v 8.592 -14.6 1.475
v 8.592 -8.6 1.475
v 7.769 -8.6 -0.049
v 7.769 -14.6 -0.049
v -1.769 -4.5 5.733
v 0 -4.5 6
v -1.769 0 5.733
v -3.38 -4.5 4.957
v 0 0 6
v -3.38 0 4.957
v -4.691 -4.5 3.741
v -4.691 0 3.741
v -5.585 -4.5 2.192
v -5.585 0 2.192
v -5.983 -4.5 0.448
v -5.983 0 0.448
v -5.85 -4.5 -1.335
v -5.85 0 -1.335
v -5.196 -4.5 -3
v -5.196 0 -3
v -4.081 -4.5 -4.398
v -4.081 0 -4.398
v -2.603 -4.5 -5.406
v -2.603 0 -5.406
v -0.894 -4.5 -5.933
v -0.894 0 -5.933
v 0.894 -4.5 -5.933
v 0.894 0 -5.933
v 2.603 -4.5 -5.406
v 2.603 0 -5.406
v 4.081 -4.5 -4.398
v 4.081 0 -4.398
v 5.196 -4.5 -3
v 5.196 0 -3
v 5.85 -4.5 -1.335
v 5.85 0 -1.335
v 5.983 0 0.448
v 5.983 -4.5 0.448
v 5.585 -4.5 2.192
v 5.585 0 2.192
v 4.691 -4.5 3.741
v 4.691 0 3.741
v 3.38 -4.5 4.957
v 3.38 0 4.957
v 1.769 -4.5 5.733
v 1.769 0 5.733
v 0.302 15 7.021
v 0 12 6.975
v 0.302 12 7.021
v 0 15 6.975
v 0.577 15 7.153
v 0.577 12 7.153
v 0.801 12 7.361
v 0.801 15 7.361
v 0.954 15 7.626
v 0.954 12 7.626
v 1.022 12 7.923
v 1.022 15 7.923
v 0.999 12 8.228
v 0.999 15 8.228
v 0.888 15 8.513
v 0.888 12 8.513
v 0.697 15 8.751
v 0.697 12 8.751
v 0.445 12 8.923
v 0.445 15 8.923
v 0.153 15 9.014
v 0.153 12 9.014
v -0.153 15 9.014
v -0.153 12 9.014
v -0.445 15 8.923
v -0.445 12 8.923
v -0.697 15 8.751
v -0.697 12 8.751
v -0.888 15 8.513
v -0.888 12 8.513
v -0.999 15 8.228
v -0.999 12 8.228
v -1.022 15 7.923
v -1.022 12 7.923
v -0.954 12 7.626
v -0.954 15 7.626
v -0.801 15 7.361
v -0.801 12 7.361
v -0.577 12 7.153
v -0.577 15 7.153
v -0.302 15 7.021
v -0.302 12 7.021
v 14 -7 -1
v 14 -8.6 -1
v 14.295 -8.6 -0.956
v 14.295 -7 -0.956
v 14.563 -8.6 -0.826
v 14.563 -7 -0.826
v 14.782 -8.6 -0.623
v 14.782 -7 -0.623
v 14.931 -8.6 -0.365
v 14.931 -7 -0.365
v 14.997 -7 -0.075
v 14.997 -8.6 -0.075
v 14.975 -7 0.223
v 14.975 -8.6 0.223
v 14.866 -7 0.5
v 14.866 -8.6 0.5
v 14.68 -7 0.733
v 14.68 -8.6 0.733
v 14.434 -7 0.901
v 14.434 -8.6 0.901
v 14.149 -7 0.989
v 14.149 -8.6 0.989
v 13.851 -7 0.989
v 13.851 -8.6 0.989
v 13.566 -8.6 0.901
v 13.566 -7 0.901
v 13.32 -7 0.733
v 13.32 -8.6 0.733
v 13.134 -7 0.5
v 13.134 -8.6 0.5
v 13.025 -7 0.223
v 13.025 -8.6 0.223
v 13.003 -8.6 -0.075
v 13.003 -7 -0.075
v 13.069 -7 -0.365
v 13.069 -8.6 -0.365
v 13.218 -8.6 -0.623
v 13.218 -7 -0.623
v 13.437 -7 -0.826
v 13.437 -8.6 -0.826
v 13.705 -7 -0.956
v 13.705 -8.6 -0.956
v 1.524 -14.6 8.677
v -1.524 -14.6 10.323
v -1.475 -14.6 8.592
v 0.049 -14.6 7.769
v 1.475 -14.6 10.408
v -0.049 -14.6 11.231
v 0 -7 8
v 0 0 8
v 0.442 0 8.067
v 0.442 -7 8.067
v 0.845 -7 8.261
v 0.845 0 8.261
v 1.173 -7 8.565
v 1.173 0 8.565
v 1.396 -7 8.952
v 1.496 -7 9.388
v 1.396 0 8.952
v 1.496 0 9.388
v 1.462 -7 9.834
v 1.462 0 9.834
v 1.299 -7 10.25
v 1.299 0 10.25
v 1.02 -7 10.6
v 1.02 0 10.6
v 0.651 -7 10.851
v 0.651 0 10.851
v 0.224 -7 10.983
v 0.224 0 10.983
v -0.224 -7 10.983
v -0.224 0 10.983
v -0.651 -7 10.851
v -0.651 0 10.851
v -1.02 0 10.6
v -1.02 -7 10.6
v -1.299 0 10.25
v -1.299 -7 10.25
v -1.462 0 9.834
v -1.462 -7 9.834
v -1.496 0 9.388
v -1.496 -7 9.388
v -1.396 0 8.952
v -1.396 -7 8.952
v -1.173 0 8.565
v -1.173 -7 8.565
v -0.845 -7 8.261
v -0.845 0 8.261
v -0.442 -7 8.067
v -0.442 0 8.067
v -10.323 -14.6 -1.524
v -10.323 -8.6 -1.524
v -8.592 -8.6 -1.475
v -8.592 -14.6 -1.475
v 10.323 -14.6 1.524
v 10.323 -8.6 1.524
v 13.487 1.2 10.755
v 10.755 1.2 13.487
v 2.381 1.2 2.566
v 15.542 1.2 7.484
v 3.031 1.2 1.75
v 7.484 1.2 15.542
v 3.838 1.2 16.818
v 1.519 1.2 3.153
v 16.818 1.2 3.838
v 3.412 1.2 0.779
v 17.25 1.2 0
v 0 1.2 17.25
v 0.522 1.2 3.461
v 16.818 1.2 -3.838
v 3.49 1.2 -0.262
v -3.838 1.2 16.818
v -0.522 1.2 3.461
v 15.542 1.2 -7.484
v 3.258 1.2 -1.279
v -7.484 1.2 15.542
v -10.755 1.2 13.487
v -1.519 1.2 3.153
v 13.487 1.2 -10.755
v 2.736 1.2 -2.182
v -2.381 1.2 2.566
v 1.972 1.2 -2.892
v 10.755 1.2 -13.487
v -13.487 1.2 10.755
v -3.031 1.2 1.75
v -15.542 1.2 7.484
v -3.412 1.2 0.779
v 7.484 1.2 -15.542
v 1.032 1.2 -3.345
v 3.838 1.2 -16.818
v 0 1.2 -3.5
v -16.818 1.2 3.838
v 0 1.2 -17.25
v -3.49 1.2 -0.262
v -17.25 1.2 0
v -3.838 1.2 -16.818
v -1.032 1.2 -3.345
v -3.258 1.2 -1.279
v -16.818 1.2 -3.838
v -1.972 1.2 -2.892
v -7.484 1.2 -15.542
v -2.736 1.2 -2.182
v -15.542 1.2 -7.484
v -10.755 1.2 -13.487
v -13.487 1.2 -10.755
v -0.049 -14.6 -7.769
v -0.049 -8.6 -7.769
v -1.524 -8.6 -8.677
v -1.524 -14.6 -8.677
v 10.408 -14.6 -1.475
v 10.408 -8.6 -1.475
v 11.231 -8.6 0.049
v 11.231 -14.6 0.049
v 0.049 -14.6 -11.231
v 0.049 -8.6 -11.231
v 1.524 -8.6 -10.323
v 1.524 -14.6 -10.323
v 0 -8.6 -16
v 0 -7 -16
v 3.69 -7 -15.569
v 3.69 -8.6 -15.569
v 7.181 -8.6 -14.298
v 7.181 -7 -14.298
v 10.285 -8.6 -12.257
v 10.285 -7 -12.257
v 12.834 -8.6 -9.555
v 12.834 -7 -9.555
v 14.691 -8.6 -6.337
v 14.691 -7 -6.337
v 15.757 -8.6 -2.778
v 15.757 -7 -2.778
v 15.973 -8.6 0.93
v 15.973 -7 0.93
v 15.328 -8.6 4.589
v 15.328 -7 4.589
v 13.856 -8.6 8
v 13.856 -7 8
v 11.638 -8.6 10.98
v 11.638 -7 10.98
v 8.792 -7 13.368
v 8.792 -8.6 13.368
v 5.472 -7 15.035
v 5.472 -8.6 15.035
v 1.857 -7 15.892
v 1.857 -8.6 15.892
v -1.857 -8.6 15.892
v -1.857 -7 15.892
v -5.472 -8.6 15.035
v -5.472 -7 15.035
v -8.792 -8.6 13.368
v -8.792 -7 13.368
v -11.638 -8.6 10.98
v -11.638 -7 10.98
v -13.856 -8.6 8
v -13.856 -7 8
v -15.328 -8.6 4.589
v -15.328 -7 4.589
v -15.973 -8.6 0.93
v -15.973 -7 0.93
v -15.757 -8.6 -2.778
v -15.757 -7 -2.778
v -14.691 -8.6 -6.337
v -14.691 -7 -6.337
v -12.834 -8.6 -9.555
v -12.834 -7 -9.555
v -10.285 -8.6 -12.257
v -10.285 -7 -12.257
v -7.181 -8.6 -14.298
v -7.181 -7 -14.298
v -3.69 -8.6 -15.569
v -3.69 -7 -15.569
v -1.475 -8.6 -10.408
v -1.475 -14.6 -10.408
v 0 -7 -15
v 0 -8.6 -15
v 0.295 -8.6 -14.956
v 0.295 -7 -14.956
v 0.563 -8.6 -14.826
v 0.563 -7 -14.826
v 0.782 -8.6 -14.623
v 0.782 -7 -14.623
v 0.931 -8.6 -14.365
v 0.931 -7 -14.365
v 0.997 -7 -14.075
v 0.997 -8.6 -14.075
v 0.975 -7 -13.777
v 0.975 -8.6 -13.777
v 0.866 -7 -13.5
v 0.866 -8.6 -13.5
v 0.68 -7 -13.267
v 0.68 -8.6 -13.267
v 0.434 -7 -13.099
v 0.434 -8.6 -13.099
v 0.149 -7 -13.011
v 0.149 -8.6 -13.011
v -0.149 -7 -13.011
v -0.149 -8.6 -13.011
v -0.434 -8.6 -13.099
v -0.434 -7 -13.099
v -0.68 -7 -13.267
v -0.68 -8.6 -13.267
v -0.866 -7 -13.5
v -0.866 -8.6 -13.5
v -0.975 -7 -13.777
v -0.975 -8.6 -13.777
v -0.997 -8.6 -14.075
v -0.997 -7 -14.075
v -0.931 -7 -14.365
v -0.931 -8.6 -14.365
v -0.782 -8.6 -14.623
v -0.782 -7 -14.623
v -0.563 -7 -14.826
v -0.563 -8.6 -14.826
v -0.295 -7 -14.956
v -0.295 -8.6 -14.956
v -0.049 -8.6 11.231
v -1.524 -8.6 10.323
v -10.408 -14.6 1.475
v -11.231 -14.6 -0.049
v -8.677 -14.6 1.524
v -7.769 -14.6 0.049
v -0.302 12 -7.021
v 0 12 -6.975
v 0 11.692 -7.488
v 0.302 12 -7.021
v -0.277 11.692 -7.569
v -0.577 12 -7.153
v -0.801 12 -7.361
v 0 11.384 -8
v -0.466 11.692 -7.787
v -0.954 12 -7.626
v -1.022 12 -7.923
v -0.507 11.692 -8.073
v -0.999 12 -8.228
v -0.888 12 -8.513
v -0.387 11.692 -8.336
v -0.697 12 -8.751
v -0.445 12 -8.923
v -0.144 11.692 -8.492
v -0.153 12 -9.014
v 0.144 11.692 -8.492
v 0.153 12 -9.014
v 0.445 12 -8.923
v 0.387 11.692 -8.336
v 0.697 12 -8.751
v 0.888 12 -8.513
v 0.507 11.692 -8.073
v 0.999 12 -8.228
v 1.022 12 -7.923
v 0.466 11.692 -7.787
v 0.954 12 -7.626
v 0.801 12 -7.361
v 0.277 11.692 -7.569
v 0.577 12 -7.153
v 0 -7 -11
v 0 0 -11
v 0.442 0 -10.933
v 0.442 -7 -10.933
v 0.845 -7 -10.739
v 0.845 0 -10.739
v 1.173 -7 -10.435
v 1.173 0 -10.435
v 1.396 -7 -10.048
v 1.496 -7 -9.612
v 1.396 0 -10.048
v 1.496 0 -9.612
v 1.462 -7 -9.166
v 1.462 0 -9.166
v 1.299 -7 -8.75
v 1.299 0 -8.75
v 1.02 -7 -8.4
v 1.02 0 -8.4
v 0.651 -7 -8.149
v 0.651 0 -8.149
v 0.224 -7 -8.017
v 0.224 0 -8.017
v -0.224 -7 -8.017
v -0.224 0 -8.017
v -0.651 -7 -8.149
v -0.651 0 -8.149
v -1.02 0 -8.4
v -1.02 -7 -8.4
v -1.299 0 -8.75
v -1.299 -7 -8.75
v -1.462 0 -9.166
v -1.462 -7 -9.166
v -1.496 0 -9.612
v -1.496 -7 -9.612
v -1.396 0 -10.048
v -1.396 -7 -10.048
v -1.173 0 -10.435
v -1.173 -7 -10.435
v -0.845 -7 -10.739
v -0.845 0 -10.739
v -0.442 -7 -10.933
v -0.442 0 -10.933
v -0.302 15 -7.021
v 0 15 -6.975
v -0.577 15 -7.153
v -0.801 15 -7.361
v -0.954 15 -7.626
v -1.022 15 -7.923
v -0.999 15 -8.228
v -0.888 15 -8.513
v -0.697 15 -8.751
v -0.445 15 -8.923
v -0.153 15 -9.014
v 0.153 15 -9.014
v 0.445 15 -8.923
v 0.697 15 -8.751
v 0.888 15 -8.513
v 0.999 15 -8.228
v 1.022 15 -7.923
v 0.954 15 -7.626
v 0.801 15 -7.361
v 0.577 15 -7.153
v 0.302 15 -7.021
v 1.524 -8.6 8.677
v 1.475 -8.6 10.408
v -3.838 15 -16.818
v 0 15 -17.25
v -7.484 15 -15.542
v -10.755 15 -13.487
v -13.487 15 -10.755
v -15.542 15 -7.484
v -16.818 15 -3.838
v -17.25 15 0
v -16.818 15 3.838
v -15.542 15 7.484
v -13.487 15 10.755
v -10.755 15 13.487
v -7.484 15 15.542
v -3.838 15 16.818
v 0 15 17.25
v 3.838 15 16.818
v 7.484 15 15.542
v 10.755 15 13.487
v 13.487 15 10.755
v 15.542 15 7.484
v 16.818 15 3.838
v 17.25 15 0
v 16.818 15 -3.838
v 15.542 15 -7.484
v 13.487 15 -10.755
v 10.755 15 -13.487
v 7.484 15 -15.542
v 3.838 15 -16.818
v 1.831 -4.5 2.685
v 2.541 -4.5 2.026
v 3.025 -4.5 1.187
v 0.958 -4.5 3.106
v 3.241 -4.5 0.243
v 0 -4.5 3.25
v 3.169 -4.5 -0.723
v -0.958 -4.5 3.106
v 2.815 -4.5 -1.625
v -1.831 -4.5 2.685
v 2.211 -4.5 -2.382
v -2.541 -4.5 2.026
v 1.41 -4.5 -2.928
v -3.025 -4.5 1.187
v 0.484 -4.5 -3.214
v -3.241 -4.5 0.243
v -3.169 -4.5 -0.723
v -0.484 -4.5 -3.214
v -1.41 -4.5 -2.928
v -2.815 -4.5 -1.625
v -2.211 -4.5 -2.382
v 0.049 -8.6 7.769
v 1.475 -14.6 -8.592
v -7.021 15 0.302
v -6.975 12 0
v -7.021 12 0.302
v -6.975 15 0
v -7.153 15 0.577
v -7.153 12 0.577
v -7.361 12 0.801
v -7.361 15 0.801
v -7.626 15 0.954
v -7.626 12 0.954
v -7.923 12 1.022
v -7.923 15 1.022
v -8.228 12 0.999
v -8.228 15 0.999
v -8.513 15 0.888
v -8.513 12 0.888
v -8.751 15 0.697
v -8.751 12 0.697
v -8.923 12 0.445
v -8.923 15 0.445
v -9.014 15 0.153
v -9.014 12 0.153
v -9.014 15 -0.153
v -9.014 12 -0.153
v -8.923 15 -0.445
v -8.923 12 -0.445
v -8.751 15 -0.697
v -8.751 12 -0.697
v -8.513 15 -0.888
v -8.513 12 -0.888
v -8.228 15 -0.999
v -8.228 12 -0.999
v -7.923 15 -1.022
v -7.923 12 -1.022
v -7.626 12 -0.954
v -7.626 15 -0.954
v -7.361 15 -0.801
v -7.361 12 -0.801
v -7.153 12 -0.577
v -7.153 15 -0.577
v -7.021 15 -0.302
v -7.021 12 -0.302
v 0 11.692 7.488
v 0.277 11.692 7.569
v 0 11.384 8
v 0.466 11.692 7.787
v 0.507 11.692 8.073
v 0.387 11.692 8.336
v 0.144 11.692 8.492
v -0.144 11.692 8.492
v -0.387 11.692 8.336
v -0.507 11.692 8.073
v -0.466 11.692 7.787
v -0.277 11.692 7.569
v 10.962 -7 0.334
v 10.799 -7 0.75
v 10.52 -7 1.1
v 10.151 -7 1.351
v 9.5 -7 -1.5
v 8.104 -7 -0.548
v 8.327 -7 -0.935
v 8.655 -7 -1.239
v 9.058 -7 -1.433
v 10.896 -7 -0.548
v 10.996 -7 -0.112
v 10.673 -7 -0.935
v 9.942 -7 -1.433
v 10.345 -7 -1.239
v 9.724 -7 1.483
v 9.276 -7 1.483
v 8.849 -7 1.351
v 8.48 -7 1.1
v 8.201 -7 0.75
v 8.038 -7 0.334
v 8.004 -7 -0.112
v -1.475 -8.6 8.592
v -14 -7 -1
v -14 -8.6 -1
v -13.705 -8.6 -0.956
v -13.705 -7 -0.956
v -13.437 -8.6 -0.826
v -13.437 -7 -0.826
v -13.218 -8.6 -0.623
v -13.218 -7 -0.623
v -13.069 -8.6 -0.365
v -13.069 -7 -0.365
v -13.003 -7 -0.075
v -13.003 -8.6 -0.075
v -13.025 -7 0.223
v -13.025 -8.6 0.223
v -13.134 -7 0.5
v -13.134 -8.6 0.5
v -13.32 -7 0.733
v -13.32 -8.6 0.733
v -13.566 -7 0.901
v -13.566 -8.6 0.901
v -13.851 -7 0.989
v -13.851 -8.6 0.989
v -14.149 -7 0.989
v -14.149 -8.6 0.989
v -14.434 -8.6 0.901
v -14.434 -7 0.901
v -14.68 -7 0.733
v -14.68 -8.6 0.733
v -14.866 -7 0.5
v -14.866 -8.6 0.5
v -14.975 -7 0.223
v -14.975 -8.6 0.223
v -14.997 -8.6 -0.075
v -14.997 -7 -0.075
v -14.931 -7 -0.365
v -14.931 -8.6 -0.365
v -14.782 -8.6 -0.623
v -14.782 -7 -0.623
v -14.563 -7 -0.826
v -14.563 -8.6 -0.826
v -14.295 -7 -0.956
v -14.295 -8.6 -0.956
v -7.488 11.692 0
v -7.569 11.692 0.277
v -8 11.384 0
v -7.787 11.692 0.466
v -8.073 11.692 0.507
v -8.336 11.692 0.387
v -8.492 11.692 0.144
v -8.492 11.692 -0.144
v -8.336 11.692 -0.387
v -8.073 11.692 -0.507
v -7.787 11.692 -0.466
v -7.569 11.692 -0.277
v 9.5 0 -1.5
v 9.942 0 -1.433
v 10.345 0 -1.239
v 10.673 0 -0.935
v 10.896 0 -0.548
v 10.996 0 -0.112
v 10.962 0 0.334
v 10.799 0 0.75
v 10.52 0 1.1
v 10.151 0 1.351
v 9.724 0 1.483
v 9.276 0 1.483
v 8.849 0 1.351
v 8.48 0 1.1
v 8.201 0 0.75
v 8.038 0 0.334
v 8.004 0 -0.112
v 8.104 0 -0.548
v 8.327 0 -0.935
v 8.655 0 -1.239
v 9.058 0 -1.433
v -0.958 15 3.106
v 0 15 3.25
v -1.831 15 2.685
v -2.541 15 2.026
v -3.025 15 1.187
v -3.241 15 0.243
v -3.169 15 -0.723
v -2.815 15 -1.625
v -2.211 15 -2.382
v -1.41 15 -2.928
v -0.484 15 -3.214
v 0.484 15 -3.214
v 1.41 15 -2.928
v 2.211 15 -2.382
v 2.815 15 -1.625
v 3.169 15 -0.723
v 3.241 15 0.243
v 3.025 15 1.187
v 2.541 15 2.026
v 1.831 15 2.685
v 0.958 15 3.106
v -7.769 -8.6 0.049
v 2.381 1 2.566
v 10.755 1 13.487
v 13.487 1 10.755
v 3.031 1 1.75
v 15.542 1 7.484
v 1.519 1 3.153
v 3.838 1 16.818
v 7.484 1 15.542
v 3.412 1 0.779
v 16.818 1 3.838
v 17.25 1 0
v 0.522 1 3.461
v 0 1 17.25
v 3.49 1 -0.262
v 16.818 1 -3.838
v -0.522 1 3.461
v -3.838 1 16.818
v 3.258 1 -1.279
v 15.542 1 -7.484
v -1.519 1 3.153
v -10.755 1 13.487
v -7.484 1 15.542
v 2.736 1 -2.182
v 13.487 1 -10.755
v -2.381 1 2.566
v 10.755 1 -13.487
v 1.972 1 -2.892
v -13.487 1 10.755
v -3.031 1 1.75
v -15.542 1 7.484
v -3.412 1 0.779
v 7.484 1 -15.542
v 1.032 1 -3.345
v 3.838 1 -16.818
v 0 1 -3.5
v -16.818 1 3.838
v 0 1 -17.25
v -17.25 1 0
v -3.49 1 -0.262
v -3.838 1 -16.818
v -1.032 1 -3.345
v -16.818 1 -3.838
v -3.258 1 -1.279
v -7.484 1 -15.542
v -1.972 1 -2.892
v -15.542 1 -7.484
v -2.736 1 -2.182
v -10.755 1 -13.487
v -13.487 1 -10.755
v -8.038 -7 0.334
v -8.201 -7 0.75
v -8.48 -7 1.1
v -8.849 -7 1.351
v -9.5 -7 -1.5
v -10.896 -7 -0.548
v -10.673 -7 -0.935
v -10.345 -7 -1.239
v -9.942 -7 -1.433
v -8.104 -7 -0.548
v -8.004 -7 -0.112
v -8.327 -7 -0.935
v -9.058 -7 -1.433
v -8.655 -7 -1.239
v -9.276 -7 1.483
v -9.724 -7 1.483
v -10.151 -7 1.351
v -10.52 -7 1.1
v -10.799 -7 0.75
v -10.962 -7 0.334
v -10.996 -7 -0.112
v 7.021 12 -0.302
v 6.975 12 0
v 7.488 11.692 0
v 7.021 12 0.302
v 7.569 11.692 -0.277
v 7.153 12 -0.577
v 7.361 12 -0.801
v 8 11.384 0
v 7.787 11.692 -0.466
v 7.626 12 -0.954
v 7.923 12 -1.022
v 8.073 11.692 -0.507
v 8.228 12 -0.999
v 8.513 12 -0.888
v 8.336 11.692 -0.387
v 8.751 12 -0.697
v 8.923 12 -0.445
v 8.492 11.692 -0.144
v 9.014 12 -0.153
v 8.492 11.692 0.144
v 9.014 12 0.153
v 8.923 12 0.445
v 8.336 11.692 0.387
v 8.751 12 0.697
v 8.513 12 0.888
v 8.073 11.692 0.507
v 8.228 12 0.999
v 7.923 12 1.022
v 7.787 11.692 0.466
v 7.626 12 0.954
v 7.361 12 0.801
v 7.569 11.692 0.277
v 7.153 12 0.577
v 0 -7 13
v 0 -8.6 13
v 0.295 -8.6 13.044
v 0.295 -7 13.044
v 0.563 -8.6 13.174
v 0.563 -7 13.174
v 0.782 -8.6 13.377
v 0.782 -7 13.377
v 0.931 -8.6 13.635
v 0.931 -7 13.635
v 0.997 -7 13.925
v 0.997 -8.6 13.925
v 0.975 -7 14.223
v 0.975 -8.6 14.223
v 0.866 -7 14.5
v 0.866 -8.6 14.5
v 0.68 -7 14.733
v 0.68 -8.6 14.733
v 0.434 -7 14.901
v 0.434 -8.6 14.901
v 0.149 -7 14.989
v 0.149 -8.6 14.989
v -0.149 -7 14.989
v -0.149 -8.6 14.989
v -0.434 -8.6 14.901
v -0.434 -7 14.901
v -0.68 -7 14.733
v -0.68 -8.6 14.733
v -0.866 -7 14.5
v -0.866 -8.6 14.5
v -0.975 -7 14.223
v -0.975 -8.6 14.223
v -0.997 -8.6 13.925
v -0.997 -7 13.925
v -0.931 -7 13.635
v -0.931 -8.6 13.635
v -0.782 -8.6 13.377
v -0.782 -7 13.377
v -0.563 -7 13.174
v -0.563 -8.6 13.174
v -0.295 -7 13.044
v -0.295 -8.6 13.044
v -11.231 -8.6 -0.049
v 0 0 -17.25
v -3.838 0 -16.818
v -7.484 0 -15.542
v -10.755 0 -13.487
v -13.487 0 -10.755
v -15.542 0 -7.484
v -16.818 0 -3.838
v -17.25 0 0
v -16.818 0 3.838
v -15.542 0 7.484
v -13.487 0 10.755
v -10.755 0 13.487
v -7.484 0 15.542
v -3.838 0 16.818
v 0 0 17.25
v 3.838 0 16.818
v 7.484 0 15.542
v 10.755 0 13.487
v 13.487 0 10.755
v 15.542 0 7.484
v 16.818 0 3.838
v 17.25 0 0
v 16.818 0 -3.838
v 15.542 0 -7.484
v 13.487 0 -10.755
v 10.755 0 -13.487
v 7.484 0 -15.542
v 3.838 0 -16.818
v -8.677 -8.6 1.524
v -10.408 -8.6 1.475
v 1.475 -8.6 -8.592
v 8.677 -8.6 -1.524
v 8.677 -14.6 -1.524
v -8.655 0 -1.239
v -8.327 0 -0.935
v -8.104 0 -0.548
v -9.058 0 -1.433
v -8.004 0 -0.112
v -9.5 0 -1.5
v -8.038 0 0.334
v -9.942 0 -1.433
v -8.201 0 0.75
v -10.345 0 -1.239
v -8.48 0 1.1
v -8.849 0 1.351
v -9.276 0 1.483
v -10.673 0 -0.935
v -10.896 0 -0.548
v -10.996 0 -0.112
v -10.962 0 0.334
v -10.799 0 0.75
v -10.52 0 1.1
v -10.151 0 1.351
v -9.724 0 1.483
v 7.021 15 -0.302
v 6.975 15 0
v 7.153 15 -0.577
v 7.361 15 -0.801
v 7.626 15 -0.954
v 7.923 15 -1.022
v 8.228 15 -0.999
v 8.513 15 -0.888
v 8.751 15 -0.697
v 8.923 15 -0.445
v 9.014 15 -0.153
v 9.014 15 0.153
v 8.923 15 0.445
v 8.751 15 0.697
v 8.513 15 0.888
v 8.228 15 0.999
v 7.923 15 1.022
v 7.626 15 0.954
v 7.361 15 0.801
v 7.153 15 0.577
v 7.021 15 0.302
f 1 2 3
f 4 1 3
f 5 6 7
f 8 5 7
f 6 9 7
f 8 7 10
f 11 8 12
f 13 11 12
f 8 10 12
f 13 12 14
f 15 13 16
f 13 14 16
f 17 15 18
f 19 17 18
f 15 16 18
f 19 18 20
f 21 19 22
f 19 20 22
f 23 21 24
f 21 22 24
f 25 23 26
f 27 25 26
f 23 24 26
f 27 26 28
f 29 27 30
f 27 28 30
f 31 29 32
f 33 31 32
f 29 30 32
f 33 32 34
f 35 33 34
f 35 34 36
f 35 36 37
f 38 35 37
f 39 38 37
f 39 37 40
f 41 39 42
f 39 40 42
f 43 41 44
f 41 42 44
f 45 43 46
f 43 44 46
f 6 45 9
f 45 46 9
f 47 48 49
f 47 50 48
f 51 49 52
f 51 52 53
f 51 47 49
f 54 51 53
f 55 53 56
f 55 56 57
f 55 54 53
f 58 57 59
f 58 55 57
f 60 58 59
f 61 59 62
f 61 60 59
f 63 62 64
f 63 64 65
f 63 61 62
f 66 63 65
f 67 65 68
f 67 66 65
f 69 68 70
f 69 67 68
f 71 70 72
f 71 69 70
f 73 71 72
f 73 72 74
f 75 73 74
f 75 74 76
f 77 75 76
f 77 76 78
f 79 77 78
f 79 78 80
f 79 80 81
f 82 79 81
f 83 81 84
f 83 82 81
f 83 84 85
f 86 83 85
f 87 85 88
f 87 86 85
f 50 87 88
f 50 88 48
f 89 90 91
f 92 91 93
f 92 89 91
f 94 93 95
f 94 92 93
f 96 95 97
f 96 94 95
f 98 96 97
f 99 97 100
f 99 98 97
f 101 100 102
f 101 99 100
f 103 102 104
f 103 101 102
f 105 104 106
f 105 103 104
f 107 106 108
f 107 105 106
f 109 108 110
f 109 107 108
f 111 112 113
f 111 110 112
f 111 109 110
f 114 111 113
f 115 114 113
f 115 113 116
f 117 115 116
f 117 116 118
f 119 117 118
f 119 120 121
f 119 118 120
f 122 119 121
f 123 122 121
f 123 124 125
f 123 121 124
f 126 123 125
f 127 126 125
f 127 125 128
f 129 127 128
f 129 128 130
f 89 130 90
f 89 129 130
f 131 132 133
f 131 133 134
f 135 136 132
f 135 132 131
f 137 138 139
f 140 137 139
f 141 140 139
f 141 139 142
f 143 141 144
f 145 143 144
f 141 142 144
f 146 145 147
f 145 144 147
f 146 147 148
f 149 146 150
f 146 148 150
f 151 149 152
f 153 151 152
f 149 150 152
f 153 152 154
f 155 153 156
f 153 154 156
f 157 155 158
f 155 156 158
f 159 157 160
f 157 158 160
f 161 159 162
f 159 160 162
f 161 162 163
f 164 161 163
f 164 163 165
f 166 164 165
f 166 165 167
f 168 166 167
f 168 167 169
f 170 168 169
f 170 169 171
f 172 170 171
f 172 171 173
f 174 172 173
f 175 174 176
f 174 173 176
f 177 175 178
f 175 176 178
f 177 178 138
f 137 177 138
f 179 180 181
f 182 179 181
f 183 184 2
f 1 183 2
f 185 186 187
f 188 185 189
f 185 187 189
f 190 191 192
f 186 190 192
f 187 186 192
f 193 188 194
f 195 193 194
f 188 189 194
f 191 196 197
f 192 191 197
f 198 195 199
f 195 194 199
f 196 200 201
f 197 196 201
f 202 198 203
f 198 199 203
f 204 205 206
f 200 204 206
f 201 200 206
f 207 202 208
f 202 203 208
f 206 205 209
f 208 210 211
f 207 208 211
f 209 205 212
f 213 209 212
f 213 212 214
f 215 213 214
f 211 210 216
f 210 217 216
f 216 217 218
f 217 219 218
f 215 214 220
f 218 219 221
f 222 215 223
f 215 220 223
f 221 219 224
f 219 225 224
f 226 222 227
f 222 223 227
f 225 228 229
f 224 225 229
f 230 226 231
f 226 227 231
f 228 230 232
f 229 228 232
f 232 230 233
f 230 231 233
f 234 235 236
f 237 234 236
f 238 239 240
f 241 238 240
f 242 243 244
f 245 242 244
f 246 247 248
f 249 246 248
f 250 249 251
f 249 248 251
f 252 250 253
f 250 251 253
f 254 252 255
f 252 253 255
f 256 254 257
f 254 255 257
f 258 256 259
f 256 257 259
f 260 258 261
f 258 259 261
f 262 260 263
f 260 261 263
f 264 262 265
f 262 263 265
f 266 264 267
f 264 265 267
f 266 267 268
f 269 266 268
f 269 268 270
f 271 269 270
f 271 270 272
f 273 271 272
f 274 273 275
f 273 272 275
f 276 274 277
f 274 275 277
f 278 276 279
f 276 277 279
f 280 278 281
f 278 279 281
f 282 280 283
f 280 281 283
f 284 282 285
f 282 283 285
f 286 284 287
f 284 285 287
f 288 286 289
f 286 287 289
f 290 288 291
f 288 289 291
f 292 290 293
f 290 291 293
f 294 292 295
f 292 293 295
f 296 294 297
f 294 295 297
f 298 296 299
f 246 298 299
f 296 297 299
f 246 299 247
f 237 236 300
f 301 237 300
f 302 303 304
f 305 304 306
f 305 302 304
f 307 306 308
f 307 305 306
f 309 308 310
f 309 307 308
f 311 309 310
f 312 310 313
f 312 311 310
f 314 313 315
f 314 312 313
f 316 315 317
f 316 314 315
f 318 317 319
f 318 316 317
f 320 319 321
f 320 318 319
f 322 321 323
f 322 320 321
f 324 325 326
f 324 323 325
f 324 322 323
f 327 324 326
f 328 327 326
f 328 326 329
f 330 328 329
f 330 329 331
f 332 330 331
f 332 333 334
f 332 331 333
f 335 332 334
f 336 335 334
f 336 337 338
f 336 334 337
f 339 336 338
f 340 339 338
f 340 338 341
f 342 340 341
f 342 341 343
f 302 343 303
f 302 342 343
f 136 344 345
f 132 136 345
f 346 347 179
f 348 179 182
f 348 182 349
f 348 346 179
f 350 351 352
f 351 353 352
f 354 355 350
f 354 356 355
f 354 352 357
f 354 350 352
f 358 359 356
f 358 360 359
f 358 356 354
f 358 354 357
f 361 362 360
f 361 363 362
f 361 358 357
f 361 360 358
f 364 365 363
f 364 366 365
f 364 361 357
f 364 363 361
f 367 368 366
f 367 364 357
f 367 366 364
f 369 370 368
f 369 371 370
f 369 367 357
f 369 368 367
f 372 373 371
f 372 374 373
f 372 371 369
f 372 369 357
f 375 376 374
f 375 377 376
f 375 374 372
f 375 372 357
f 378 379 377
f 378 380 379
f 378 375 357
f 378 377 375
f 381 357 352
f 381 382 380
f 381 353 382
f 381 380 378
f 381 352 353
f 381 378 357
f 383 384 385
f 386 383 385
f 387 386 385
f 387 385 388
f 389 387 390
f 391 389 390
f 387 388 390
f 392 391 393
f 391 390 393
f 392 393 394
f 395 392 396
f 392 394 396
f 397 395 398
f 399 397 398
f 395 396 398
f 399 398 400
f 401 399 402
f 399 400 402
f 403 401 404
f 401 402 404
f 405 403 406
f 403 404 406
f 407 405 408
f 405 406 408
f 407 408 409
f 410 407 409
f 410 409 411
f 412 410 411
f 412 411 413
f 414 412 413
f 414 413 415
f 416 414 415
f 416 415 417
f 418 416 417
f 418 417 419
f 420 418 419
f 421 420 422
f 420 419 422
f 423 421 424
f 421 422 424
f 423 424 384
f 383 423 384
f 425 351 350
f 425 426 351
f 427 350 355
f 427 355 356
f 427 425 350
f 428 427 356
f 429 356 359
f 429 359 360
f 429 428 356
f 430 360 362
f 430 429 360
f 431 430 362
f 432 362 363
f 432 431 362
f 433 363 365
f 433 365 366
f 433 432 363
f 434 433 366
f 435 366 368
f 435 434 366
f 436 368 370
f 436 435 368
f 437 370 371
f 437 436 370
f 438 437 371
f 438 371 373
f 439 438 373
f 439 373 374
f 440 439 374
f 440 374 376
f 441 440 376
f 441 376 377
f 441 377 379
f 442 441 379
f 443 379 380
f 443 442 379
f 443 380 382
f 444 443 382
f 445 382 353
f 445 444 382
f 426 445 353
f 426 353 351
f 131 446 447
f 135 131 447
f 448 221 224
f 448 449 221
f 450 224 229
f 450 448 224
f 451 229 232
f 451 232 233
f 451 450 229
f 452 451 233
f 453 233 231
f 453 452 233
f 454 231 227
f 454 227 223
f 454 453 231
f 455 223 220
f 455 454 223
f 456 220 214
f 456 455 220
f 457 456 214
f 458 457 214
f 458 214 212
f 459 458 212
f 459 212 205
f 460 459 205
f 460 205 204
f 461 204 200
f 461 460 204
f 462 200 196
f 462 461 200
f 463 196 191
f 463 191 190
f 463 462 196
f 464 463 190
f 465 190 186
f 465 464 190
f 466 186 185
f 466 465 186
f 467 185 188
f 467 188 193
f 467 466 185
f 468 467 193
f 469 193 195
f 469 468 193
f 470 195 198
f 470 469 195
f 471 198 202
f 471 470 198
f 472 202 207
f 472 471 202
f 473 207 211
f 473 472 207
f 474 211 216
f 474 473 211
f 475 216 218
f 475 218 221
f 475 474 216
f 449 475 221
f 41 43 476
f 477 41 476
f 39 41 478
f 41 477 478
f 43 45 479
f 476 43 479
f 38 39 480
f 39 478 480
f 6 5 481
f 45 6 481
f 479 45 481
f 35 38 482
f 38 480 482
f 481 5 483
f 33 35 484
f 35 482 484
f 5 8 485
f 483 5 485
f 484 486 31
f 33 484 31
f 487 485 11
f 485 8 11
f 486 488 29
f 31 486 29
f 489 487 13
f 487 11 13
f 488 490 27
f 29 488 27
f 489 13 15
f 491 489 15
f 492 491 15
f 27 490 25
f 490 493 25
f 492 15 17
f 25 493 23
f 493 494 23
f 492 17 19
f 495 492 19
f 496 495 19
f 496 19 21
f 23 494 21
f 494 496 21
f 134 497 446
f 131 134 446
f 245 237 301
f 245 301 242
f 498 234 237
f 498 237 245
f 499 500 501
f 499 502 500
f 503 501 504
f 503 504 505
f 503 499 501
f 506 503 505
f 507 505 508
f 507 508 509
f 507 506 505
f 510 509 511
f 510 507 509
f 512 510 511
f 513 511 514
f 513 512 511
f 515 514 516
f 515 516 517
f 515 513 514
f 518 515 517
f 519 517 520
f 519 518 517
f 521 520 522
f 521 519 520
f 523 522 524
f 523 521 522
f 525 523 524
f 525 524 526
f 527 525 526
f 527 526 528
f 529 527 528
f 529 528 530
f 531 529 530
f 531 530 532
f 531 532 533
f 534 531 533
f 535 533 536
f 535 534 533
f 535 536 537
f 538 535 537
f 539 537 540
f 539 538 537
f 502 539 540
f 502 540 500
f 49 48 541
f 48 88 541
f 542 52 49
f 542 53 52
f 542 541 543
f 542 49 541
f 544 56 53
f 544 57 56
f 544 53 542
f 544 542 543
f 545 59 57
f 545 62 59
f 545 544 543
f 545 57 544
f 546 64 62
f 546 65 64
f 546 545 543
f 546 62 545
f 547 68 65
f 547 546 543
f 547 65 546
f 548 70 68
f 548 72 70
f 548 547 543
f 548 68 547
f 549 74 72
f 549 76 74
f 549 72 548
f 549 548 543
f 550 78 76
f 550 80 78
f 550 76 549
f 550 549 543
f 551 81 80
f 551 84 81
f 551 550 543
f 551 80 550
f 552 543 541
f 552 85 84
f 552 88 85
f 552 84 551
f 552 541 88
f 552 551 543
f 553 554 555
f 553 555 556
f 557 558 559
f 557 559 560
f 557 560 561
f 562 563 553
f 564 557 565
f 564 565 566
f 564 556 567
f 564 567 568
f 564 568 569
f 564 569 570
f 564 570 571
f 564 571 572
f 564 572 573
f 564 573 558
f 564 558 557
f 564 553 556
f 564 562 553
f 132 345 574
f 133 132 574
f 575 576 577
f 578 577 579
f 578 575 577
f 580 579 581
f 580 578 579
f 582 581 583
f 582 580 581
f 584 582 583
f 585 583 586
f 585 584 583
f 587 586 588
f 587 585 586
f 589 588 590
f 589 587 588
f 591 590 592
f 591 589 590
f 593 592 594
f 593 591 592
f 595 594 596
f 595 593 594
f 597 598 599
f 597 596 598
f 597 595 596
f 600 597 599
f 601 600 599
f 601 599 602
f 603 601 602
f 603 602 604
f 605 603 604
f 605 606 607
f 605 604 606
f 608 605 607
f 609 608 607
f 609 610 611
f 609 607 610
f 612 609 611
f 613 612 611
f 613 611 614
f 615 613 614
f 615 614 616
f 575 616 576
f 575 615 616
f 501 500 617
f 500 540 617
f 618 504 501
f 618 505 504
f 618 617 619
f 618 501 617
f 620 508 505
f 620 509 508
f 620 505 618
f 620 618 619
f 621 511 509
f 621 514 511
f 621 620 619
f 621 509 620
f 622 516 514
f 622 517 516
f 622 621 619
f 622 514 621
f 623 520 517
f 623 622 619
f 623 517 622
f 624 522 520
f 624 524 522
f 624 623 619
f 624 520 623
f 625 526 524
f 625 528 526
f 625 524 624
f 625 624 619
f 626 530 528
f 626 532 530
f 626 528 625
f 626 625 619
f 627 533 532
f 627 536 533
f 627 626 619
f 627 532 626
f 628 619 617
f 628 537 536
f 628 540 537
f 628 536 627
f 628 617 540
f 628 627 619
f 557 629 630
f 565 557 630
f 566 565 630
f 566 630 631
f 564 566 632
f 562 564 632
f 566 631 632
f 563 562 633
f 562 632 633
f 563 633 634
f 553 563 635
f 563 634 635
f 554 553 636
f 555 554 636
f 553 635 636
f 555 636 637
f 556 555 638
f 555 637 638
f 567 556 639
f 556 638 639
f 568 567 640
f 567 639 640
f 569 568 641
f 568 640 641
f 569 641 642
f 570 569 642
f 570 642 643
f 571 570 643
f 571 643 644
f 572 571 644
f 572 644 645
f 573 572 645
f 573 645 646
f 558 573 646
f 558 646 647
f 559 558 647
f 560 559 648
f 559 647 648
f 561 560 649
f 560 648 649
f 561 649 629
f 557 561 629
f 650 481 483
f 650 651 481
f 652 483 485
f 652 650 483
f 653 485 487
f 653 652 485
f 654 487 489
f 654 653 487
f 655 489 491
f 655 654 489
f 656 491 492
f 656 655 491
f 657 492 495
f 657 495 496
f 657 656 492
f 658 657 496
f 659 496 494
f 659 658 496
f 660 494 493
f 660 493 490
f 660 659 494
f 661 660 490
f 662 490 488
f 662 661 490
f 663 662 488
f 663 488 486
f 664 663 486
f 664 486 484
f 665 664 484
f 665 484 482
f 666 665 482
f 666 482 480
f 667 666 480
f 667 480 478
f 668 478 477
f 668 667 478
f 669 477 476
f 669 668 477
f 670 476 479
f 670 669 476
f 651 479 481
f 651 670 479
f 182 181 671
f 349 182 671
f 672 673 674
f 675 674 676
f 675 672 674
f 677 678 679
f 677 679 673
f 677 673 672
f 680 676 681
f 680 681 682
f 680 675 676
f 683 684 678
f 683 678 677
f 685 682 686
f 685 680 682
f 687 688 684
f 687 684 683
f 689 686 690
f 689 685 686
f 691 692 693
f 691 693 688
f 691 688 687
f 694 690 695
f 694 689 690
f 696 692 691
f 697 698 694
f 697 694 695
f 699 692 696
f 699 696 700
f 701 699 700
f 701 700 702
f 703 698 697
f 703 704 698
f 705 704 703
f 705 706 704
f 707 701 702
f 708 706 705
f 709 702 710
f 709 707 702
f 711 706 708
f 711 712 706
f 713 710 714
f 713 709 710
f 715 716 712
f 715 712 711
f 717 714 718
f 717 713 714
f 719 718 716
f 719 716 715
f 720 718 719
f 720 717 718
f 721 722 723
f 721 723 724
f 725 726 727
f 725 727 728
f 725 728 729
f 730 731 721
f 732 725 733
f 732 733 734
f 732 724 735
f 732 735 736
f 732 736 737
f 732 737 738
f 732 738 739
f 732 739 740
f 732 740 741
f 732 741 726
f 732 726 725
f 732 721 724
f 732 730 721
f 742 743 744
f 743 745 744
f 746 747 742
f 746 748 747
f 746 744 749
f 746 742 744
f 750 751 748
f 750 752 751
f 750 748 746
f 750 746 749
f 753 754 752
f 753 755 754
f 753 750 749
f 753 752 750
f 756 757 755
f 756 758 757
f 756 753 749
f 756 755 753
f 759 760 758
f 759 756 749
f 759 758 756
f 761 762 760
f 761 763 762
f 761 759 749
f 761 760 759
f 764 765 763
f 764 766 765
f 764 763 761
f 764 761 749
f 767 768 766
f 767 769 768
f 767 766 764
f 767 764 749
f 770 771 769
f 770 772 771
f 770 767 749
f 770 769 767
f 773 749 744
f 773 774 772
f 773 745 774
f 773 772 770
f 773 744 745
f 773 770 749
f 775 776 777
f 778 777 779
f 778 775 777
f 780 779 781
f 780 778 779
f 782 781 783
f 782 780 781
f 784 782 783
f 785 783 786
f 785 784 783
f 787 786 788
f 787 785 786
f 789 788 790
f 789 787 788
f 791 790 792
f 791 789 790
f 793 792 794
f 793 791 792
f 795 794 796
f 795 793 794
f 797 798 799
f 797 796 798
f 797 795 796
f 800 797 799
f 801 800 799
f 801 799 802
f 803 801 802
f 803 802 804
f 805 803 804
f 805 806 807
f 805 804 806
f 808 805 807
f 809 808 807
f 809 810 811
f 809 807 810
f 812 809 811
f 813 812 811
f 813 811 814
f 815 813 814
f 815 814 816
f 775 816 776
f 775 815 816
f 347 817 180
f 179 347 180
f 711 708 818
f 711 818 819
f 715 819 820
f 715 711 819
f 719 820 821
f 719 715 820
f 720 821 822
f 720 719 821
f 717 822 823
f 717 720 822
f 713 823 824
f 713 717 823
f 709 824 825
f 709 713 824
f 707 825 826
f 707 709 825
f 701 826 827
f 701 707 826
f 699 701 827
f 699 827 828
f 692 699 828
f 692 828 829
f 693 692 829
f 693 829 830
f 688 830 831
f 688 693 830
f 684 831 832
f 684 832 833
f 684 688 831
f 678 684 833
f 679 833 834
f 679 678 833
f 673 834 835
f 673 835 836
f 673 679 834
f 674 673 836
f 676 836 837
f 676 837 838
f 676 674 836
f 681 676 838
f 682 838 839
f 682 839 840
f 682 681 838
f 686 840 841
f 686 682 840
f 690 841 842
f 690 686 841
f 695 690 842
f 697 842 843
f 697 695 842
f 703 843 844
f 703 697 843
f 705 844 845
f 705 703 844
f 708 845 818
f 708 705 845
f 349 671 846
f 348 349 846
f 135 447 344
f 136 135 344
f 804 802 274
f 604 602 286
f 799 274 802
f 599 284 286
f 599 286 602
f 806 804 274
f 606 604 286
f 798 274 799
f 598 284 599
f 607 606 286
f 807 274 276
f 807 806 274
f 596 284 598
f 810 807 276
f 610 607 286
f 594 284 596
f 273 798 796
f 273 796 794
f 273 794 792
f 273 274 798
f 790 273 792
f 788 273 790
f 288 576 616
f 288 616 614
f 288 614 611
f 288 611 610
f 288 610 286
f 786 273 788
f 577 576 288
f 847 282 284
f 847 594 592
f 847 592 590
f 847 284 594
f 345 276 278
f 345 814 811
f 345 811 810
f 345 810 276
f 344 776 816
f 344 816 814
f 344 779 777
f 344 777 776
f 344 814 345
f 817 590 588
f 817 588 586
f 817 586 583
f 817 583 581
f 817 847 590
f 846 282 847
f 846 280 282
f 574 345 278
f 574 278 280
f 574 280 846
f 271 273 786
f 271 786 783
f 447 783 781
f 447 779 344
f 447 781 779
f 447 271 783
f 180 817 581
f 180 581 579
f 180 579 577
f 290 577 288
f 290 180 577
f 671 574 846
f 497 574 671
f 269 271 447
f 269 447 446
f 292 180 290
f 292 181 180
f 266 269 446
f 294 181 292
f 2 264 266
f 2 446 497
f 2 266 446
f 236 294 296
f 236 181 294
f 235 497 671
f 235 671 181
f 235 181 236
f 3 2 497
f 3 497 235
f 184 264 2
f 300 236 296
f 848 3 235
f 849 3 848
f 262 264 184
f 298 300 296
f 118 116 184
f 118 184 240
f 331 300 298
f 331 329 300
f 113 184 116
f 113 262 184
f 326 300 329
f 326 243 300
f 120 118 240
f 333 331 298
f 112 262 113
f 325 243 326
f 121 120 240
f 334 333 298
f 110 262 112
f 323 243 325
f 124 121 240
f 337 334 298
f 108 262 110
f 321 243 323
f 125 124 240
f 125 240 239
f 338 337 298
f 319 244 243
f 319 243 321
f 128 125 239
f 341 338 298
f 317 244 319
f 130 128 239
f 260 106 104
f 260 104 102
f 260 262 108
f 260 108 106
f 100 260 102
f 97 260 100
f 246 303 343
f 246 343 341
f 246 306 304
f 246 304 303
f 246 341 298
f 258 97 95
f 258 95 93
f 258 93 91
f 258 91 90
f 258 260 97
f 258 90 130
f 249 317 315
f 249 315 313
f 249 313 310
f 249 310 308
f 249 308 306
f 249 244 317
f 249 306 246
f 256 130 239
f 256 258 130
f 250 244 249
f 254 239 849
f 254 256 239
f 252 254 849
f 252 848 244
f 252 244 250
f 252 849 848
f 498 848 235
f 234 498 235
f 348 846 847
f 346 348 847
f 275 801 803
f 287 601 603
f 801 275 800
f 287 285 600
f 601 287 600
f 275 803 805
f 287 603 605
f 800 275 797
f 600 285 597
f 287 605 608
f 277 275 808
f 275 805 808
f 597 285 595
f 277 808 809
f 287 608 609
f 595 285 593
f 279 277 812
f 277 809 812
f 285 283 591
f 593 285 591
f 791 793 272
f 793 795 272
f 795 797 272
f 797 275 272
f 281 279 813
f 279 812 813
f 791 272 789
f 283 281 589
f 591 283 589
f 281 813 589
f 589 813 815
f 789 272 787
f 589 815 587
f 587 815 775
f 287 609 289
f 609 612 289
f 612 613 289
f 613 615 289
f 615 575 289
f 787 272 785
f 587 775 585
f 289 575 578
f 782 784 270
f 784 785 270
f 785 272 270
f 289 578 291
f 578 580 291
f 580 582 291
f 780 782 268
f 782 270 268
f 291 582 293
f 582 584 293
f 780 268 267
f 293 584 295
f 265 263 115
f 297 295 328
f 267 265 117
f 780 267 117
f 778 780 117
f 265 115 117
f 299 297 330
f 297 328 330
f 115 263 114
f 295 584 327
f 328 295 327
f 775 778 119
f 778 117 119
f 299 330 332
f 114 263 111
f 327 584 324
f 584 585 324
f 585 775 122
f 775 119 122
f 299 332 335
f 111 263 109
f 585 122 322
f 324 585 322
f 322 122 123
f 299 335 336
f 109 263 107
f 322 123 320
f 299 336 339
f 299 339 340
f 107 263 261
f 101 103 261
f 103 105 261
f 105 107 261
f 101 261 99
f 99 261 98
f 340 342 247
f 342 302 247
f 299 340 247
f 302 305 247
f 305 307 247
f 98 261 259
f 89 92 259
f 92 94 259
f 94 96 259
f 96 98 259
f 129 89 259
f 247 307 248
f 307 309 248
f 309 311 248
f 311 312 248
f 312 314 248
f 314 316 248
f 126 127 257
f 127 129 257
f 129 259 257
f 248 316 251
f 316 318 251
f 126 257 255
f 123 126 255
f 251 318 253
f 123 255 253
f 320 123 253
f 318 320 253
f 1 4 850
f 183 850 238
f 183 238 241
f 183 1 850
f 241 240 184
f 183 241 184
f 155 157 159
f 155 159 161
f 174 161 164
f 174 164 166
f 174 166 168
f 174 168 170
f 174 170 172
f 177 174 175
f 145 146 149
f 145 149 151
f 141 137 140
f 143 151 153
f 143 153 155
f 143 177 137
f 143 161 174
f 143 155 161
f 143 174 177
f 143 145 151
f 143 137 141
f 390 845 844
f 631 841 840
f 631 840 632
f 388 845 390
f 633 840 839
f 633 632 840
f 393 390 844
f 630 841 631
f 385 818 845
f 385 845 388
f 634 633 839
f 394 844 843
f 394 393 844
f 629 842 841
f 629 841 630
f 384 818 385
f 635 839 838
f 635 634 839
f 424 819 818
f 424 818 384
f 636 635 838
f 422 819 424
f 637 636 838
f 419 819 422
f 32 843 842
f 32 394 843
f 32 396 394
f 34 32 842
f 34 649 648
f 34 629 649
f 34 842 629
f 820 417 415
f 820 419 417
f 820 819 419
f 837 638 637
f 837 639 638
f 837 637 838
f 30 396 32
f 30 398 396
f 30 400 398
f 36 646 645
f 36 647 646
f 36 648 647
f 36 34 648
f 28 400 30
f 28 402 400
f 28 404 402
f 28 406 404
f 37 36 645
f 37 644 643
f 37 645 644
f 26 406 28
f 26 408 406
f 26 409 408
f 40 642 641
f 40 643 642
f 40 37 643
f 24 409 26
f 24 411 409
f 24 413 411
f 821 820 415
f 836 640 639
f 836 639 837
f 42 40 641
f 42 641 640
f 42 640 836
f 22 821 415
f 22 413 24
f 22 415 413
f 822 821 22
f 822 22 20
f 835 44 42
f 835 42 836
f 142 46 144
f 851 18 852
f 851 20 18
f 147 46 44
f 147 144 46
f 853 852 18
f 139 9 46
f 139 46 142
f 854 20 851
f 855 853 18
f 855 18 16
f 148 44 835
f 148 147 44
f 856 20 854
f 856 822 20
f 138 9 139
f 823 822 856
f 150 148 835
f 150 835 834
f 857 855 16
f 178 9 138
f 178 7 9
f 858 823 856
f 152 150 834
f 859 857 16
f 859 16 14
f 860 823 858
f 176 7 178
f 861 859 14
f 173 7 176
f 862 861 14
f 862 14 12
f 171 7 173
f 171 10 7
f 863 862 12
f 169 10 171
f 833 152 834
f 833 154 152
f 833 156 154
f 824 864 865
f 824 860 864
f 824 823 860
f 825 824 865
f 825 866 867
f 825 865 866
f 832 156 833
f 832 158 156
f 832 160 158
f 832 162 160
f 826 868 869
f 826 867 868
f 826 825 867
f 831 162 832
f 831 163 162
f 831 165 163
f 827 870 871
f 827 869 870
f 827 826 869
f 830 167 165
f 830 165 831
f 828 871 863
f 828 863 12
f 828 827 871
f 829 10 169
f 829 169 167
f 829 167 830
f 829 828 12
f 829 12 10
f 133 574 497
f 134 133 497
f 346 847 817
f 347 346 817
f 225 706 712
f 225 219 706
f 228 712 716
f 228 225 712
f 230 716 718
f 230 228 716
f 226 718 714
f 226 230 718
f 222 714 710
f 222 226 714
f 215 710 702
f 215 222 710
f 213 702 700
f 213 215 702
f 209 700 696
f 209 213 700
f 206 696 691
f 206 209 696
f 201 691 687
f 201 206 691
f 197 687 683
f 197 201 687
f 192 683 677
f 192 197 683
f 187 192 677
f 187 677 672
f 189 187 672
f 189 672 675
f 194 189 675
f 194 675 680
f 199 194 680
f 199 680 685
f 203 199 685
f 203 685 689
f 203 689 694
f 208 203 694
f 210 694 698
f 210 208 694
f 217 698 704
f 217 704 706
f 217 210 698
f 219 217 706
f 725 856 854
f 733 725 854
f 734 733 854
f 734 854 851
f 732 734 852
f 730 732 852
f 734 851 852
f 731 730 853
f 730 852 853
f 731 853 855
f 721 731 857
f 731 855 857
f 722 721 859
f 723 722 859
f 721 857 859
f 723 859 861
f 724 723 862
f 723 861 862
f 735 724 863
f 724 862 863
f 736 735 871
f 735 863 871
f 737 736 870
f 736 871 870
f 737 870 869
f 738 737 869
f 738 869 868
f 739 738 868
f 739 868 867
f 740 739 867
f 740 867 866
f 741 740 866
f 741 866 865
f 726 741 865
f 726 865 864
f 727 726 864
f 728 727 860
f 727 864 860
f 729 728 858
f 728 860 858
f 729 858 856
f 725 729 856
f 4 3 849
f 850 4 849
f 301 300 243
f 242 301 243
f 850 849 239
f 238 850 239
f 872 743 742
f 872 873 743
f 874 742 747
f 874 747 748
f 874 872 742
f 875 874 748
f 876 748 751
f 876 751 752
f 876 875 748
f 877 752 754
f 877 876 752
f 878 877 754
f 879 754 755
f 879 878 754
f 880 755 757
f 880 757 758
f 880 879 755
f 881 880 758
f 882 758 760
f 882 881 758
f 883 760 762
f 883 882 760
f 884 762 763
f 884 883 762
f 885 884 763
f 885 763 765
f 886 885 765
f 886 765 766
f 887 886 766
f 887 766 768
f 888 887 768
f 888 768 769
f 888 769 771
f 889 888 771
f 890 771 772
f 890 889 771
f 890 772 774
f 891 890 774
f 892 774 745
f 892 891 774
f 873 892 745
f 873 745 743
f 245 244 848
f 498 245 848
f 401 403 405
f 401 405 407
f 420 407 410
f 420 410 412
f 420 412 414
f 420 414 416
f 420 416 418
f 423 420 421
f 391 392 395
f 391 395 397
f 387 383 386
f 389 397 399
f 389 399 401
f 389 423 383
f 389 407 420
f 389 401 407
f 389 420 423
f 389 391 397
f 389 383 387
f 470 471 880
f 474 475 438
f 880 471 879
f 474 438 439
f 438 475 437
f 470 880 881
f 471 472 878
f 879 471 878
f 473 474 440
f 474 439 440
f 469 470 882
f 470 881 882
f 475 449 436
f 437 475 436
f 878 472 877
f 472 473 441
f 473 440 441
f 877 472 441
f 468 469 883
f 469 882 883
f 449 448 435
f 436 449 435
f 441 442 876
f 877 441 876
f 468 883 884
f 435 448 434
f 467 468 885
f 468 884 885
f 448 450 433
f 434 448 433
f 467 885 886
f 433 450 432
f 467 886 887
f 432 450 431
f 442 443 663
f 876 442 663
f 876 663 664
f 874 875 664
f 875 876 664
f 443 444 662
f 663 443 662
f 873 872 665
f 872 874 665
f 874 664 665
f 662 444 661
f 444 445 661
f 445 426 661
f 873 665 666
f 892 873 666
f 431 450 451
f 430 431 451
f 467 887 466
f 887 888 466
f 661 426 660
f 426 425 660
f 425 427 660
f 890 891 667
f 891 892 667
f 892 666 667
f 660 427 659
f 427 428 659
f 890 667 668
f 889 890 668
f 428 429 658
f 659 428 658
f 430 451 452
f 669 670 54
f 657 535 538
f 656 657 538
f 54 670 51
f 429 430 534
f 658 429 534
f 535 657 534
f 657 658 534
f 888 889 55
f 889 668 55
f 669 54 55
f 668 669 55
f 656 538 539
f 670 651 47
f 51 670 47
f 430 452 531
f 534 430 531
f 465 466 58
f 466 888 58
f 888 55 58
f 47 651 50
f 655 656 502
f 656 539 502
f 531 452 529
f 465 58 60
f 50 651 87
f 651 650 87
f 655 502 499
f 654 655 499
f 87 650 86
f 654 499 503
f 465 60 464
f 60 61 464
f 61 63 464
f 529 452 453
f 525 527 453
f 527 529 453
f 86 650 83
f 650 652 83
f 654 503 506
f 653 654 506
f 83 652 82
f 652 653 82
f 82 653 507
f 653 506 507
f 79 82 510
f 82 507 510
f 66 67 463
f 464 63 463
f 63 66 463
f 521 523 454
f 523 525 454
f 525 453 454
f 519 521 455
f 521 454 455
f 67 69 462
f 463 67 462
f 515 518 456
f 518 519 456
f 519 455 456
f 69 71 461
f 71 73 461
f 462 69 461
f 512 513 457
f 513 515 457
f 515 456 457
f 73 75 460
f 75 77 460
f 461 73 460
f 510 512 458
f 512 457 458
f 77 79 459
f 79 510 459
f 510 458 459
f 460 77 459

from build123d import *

# Parameters (mm, degrees)
SKETCH_1_W               = 17.25
SKETCH_1_H               = 15
SKETCH_2_W               = 13.75
SKETCH_2_H               = 0.2
CUT_EXTRUDE_1_REACH      = 30.638
SKETCH_3_R               = 3.25
PATTERN_CIRCULAR_1_COUNT = 4
SKETCH_8_R               = 1.5
EXTRUDE_1_DEPTH          = 7
SKETCH_9_R               = 16
EXTRUDE_2_DEPTH          = 1.6
EXTRUDE_3_DEPTH          = 6
CUT_EXTRUDE_2_DEPTH      = 34.942377642
CUT_EXTRUDE_2_DEPTH_BACK = 1.6
SKETCH_12_R              = 1
SKETCH_14_W              = 2.75
SKETCH_14_H              = 4.5


with BuildPart() as part:
    # 草图1 → 旋转2 (revolve)
    with BuildSketch(Plane.XY, mode=Mode.PRIVATE) as revolve_2_sk:
        with Locations((8.625, 7.5)):
            Rectangle(SKETCH_1_W, SKETCH_1_H)
    revolve(revolve_2_sk.sketch.rotate(Axis((0, 0, 0), (0, 1, 0)), 90), axis=Axis((0, 0, 0), (0, 1, 0)))

    # 草图2 → 切除-旋转2 (revolve, cut)
    with BuildSketch(Plane.XY, mode=Mode.PRIVATE) as cut_revolve_2_sk:
        with Locations((-10.375, 1.1)):
            Rectangle(SKETCH_2_W, SKETCH_2_H)
    revolve(cut_revolve_2_sk.sketch.rotate(Axis((0, 0, 0), (0, 1, 0)), 270), axis=Axis((0, 0, 0), (0, 1, 0)), mode=Mode.SUBTRACT)

    # 草图3 → 切除-拉伸1 (cut, up to next)
    with BuildSketch(Plane(origin=(0, 15, 0), x_dir=(1, 0, 0), z_dir=(0, 1, 0)), mode=Mode.PRIVATE) as cut_extrude_1_sk1:
        with Locations(Location((0, 0, 0), (0, 0, 270))):
            Circle(SKETCH_3_R)
    cut_extrude_1_tool1 = extrude(cut_extrude_1_sk1.sketch, amount=-CUT_EXTRUDE_1_REACH, mode=Mode.PRIVATE) & part.part
    add(cut_extrude_1_tool1.solids().sort_by_distance((0, 15, 0))[0], mode=Mode.SUBTRACT)

    # 草图6 → M2.5 螺纹孔1 (revolve, cut)
    with BuildSketch(Plane(origin=(0, 15, -8), x_dir=(0, 0, 1), z_dir=(1, 0, 0))):
        Polygon((0, 0), (0, 3.615882135), (1.025, 3), (1.025, 0), align=None)
    hole_wizard_m2_5_1 = revolve(axis=Axis((0, 21.35, -8), (0, -1, 0)), mode=Mode.SUBTRACT)

    # 阵列(圆周)1: M2.5 螺纹孔1 ×4 about axis
    pattern_circular_1_axis = Axis((0, 0, 0), (0, 1, 0))
    for i in range(1, PATTERN_CIRCULAR_1_COUNT):
        add(hole_wizard_m2_5_1.rotate(pattern_circular_1_axis, i * 360 / PATTERN_CIRCULAR_1_COUNT), mode=Mode.SUBTRACT)

    # 草图8 → 凸台-拉伸1 (add)
    with BuildSketch(Plane.XZ):
        with Locations(Location((0, 9.5, 0), (0, 0, 270))):
            Circle(SKETCH_8_R)
        with Locations(Location((9.5, 0, 0), (0, 0, 270))):
            Circle(SKETCH_8_R)
        with Locations(Location((0, -9.5, 0), (0, 0, 270))):
            Circle(SKETCH_8_R)
        with Locations(Location((-9.5, 0, 0), (0, 0, 270))):
            Circle(SKETCH_8_R)
    extrude(amount=EXTRUDE_1_DEPTH)

    # 草图14 → 旋转3 (revolve)
    with BuildSketch(Plane.XY, mode=Mode.PRIVATE) as revolve_3_sk:
        with Locations((4.625, -2.25)):
            Rectangle(SKETCH_14_W, SKETCH_14_H)
    revolve(revolve_3_sk.sketch.rotate(Axis((0, 0, 0), (0, -1, 0)), 90), axis=Axis((0, 0, 0), (0, -1, 0)))


with BuildPart() as body_2:
    # 草图9 → 凸台-拉伸2 (new body)
    with BuildSketch(Plane(origin=(0, -7, 0), x_dir=(-1, 0, 0), z_dir=(0, -1, 0))):
        with Locations(Location((0, 0, 0), (0, 0, 90))):
            Circle(SKETCH_9_R)
    extrude(amount=EXTRUDE_2_DEPTH)

    # 草图11 → 凸台-拉伸3 (add)
    with BuildSketch(Plane.XZ.offset(8.6)):
        Polygon((8.676777179, -1.52391082), (10.408134073, -1.474887286), (11.231356894, 0.049023534), (10.323222821, 1.52391082), (8.591865927, 1.474887286), (7.768643106, -0.049023534), align=None)
        Polygon((1.52391082, 8.676777179), (1.474887286, 10.408134073), (-0.049023534, 11.231356894), (-1.52391082, 10.323222821), (-1.474887286, 8.591865927), (0.049023534, 7.768643106), align=None)
        Polygon((-1.52391082, -8.676777179), (-1.474887286, -10.408134073), (0.049023534, -11.231356894), (1.52391082, -10.323222821), (1.474887286, -8.591865927), (-0.049023534, -7.768643106), align=None)
        Polygon((-8.676777179, 1.52391082), (-10.408134073, 1.474887286), (-11.231356894, -0.049023534), (-10.323222821, -1.52391082), (-8.591865927, -1.474887286), (-7.768643106, 0.049023534), align=None)
    extrude(amount=EXTRUDE_3_DEPTH)

    # 草图12 → 切除-拉伸2 (cut, two sides: drawn at the far end of the back side and taken through both)
    with BuildSketch(Plane.XZ.offset(8.6).offset(-CUT_EXTRUDE_2_DEPTH_BACK)):
        with Locations(Location((0, 14, 0), (0, 0, 270))):
            Circle(SKETCH_12_R)
        with Locations(Location((14, 0, 0), (0, 0, 270))):
            Circle(SKETCH_12_R)
        with Locations(Location((0, -14, 0), (0, 0, 270))):
            Circle(SKETCH_12_R)
        with Locations(Location((-14, 0, 0), (0, 0, 270))):
            Circle(SKETCH_12_R)
    extrude(amount=CUT_EXTRUDE_2_DEPTH + CUT_EXTRUDE_2_DEPTH_BACK, mode=Mode.SUBTRACT)


solid = Compound([part.part, body_2.part])
